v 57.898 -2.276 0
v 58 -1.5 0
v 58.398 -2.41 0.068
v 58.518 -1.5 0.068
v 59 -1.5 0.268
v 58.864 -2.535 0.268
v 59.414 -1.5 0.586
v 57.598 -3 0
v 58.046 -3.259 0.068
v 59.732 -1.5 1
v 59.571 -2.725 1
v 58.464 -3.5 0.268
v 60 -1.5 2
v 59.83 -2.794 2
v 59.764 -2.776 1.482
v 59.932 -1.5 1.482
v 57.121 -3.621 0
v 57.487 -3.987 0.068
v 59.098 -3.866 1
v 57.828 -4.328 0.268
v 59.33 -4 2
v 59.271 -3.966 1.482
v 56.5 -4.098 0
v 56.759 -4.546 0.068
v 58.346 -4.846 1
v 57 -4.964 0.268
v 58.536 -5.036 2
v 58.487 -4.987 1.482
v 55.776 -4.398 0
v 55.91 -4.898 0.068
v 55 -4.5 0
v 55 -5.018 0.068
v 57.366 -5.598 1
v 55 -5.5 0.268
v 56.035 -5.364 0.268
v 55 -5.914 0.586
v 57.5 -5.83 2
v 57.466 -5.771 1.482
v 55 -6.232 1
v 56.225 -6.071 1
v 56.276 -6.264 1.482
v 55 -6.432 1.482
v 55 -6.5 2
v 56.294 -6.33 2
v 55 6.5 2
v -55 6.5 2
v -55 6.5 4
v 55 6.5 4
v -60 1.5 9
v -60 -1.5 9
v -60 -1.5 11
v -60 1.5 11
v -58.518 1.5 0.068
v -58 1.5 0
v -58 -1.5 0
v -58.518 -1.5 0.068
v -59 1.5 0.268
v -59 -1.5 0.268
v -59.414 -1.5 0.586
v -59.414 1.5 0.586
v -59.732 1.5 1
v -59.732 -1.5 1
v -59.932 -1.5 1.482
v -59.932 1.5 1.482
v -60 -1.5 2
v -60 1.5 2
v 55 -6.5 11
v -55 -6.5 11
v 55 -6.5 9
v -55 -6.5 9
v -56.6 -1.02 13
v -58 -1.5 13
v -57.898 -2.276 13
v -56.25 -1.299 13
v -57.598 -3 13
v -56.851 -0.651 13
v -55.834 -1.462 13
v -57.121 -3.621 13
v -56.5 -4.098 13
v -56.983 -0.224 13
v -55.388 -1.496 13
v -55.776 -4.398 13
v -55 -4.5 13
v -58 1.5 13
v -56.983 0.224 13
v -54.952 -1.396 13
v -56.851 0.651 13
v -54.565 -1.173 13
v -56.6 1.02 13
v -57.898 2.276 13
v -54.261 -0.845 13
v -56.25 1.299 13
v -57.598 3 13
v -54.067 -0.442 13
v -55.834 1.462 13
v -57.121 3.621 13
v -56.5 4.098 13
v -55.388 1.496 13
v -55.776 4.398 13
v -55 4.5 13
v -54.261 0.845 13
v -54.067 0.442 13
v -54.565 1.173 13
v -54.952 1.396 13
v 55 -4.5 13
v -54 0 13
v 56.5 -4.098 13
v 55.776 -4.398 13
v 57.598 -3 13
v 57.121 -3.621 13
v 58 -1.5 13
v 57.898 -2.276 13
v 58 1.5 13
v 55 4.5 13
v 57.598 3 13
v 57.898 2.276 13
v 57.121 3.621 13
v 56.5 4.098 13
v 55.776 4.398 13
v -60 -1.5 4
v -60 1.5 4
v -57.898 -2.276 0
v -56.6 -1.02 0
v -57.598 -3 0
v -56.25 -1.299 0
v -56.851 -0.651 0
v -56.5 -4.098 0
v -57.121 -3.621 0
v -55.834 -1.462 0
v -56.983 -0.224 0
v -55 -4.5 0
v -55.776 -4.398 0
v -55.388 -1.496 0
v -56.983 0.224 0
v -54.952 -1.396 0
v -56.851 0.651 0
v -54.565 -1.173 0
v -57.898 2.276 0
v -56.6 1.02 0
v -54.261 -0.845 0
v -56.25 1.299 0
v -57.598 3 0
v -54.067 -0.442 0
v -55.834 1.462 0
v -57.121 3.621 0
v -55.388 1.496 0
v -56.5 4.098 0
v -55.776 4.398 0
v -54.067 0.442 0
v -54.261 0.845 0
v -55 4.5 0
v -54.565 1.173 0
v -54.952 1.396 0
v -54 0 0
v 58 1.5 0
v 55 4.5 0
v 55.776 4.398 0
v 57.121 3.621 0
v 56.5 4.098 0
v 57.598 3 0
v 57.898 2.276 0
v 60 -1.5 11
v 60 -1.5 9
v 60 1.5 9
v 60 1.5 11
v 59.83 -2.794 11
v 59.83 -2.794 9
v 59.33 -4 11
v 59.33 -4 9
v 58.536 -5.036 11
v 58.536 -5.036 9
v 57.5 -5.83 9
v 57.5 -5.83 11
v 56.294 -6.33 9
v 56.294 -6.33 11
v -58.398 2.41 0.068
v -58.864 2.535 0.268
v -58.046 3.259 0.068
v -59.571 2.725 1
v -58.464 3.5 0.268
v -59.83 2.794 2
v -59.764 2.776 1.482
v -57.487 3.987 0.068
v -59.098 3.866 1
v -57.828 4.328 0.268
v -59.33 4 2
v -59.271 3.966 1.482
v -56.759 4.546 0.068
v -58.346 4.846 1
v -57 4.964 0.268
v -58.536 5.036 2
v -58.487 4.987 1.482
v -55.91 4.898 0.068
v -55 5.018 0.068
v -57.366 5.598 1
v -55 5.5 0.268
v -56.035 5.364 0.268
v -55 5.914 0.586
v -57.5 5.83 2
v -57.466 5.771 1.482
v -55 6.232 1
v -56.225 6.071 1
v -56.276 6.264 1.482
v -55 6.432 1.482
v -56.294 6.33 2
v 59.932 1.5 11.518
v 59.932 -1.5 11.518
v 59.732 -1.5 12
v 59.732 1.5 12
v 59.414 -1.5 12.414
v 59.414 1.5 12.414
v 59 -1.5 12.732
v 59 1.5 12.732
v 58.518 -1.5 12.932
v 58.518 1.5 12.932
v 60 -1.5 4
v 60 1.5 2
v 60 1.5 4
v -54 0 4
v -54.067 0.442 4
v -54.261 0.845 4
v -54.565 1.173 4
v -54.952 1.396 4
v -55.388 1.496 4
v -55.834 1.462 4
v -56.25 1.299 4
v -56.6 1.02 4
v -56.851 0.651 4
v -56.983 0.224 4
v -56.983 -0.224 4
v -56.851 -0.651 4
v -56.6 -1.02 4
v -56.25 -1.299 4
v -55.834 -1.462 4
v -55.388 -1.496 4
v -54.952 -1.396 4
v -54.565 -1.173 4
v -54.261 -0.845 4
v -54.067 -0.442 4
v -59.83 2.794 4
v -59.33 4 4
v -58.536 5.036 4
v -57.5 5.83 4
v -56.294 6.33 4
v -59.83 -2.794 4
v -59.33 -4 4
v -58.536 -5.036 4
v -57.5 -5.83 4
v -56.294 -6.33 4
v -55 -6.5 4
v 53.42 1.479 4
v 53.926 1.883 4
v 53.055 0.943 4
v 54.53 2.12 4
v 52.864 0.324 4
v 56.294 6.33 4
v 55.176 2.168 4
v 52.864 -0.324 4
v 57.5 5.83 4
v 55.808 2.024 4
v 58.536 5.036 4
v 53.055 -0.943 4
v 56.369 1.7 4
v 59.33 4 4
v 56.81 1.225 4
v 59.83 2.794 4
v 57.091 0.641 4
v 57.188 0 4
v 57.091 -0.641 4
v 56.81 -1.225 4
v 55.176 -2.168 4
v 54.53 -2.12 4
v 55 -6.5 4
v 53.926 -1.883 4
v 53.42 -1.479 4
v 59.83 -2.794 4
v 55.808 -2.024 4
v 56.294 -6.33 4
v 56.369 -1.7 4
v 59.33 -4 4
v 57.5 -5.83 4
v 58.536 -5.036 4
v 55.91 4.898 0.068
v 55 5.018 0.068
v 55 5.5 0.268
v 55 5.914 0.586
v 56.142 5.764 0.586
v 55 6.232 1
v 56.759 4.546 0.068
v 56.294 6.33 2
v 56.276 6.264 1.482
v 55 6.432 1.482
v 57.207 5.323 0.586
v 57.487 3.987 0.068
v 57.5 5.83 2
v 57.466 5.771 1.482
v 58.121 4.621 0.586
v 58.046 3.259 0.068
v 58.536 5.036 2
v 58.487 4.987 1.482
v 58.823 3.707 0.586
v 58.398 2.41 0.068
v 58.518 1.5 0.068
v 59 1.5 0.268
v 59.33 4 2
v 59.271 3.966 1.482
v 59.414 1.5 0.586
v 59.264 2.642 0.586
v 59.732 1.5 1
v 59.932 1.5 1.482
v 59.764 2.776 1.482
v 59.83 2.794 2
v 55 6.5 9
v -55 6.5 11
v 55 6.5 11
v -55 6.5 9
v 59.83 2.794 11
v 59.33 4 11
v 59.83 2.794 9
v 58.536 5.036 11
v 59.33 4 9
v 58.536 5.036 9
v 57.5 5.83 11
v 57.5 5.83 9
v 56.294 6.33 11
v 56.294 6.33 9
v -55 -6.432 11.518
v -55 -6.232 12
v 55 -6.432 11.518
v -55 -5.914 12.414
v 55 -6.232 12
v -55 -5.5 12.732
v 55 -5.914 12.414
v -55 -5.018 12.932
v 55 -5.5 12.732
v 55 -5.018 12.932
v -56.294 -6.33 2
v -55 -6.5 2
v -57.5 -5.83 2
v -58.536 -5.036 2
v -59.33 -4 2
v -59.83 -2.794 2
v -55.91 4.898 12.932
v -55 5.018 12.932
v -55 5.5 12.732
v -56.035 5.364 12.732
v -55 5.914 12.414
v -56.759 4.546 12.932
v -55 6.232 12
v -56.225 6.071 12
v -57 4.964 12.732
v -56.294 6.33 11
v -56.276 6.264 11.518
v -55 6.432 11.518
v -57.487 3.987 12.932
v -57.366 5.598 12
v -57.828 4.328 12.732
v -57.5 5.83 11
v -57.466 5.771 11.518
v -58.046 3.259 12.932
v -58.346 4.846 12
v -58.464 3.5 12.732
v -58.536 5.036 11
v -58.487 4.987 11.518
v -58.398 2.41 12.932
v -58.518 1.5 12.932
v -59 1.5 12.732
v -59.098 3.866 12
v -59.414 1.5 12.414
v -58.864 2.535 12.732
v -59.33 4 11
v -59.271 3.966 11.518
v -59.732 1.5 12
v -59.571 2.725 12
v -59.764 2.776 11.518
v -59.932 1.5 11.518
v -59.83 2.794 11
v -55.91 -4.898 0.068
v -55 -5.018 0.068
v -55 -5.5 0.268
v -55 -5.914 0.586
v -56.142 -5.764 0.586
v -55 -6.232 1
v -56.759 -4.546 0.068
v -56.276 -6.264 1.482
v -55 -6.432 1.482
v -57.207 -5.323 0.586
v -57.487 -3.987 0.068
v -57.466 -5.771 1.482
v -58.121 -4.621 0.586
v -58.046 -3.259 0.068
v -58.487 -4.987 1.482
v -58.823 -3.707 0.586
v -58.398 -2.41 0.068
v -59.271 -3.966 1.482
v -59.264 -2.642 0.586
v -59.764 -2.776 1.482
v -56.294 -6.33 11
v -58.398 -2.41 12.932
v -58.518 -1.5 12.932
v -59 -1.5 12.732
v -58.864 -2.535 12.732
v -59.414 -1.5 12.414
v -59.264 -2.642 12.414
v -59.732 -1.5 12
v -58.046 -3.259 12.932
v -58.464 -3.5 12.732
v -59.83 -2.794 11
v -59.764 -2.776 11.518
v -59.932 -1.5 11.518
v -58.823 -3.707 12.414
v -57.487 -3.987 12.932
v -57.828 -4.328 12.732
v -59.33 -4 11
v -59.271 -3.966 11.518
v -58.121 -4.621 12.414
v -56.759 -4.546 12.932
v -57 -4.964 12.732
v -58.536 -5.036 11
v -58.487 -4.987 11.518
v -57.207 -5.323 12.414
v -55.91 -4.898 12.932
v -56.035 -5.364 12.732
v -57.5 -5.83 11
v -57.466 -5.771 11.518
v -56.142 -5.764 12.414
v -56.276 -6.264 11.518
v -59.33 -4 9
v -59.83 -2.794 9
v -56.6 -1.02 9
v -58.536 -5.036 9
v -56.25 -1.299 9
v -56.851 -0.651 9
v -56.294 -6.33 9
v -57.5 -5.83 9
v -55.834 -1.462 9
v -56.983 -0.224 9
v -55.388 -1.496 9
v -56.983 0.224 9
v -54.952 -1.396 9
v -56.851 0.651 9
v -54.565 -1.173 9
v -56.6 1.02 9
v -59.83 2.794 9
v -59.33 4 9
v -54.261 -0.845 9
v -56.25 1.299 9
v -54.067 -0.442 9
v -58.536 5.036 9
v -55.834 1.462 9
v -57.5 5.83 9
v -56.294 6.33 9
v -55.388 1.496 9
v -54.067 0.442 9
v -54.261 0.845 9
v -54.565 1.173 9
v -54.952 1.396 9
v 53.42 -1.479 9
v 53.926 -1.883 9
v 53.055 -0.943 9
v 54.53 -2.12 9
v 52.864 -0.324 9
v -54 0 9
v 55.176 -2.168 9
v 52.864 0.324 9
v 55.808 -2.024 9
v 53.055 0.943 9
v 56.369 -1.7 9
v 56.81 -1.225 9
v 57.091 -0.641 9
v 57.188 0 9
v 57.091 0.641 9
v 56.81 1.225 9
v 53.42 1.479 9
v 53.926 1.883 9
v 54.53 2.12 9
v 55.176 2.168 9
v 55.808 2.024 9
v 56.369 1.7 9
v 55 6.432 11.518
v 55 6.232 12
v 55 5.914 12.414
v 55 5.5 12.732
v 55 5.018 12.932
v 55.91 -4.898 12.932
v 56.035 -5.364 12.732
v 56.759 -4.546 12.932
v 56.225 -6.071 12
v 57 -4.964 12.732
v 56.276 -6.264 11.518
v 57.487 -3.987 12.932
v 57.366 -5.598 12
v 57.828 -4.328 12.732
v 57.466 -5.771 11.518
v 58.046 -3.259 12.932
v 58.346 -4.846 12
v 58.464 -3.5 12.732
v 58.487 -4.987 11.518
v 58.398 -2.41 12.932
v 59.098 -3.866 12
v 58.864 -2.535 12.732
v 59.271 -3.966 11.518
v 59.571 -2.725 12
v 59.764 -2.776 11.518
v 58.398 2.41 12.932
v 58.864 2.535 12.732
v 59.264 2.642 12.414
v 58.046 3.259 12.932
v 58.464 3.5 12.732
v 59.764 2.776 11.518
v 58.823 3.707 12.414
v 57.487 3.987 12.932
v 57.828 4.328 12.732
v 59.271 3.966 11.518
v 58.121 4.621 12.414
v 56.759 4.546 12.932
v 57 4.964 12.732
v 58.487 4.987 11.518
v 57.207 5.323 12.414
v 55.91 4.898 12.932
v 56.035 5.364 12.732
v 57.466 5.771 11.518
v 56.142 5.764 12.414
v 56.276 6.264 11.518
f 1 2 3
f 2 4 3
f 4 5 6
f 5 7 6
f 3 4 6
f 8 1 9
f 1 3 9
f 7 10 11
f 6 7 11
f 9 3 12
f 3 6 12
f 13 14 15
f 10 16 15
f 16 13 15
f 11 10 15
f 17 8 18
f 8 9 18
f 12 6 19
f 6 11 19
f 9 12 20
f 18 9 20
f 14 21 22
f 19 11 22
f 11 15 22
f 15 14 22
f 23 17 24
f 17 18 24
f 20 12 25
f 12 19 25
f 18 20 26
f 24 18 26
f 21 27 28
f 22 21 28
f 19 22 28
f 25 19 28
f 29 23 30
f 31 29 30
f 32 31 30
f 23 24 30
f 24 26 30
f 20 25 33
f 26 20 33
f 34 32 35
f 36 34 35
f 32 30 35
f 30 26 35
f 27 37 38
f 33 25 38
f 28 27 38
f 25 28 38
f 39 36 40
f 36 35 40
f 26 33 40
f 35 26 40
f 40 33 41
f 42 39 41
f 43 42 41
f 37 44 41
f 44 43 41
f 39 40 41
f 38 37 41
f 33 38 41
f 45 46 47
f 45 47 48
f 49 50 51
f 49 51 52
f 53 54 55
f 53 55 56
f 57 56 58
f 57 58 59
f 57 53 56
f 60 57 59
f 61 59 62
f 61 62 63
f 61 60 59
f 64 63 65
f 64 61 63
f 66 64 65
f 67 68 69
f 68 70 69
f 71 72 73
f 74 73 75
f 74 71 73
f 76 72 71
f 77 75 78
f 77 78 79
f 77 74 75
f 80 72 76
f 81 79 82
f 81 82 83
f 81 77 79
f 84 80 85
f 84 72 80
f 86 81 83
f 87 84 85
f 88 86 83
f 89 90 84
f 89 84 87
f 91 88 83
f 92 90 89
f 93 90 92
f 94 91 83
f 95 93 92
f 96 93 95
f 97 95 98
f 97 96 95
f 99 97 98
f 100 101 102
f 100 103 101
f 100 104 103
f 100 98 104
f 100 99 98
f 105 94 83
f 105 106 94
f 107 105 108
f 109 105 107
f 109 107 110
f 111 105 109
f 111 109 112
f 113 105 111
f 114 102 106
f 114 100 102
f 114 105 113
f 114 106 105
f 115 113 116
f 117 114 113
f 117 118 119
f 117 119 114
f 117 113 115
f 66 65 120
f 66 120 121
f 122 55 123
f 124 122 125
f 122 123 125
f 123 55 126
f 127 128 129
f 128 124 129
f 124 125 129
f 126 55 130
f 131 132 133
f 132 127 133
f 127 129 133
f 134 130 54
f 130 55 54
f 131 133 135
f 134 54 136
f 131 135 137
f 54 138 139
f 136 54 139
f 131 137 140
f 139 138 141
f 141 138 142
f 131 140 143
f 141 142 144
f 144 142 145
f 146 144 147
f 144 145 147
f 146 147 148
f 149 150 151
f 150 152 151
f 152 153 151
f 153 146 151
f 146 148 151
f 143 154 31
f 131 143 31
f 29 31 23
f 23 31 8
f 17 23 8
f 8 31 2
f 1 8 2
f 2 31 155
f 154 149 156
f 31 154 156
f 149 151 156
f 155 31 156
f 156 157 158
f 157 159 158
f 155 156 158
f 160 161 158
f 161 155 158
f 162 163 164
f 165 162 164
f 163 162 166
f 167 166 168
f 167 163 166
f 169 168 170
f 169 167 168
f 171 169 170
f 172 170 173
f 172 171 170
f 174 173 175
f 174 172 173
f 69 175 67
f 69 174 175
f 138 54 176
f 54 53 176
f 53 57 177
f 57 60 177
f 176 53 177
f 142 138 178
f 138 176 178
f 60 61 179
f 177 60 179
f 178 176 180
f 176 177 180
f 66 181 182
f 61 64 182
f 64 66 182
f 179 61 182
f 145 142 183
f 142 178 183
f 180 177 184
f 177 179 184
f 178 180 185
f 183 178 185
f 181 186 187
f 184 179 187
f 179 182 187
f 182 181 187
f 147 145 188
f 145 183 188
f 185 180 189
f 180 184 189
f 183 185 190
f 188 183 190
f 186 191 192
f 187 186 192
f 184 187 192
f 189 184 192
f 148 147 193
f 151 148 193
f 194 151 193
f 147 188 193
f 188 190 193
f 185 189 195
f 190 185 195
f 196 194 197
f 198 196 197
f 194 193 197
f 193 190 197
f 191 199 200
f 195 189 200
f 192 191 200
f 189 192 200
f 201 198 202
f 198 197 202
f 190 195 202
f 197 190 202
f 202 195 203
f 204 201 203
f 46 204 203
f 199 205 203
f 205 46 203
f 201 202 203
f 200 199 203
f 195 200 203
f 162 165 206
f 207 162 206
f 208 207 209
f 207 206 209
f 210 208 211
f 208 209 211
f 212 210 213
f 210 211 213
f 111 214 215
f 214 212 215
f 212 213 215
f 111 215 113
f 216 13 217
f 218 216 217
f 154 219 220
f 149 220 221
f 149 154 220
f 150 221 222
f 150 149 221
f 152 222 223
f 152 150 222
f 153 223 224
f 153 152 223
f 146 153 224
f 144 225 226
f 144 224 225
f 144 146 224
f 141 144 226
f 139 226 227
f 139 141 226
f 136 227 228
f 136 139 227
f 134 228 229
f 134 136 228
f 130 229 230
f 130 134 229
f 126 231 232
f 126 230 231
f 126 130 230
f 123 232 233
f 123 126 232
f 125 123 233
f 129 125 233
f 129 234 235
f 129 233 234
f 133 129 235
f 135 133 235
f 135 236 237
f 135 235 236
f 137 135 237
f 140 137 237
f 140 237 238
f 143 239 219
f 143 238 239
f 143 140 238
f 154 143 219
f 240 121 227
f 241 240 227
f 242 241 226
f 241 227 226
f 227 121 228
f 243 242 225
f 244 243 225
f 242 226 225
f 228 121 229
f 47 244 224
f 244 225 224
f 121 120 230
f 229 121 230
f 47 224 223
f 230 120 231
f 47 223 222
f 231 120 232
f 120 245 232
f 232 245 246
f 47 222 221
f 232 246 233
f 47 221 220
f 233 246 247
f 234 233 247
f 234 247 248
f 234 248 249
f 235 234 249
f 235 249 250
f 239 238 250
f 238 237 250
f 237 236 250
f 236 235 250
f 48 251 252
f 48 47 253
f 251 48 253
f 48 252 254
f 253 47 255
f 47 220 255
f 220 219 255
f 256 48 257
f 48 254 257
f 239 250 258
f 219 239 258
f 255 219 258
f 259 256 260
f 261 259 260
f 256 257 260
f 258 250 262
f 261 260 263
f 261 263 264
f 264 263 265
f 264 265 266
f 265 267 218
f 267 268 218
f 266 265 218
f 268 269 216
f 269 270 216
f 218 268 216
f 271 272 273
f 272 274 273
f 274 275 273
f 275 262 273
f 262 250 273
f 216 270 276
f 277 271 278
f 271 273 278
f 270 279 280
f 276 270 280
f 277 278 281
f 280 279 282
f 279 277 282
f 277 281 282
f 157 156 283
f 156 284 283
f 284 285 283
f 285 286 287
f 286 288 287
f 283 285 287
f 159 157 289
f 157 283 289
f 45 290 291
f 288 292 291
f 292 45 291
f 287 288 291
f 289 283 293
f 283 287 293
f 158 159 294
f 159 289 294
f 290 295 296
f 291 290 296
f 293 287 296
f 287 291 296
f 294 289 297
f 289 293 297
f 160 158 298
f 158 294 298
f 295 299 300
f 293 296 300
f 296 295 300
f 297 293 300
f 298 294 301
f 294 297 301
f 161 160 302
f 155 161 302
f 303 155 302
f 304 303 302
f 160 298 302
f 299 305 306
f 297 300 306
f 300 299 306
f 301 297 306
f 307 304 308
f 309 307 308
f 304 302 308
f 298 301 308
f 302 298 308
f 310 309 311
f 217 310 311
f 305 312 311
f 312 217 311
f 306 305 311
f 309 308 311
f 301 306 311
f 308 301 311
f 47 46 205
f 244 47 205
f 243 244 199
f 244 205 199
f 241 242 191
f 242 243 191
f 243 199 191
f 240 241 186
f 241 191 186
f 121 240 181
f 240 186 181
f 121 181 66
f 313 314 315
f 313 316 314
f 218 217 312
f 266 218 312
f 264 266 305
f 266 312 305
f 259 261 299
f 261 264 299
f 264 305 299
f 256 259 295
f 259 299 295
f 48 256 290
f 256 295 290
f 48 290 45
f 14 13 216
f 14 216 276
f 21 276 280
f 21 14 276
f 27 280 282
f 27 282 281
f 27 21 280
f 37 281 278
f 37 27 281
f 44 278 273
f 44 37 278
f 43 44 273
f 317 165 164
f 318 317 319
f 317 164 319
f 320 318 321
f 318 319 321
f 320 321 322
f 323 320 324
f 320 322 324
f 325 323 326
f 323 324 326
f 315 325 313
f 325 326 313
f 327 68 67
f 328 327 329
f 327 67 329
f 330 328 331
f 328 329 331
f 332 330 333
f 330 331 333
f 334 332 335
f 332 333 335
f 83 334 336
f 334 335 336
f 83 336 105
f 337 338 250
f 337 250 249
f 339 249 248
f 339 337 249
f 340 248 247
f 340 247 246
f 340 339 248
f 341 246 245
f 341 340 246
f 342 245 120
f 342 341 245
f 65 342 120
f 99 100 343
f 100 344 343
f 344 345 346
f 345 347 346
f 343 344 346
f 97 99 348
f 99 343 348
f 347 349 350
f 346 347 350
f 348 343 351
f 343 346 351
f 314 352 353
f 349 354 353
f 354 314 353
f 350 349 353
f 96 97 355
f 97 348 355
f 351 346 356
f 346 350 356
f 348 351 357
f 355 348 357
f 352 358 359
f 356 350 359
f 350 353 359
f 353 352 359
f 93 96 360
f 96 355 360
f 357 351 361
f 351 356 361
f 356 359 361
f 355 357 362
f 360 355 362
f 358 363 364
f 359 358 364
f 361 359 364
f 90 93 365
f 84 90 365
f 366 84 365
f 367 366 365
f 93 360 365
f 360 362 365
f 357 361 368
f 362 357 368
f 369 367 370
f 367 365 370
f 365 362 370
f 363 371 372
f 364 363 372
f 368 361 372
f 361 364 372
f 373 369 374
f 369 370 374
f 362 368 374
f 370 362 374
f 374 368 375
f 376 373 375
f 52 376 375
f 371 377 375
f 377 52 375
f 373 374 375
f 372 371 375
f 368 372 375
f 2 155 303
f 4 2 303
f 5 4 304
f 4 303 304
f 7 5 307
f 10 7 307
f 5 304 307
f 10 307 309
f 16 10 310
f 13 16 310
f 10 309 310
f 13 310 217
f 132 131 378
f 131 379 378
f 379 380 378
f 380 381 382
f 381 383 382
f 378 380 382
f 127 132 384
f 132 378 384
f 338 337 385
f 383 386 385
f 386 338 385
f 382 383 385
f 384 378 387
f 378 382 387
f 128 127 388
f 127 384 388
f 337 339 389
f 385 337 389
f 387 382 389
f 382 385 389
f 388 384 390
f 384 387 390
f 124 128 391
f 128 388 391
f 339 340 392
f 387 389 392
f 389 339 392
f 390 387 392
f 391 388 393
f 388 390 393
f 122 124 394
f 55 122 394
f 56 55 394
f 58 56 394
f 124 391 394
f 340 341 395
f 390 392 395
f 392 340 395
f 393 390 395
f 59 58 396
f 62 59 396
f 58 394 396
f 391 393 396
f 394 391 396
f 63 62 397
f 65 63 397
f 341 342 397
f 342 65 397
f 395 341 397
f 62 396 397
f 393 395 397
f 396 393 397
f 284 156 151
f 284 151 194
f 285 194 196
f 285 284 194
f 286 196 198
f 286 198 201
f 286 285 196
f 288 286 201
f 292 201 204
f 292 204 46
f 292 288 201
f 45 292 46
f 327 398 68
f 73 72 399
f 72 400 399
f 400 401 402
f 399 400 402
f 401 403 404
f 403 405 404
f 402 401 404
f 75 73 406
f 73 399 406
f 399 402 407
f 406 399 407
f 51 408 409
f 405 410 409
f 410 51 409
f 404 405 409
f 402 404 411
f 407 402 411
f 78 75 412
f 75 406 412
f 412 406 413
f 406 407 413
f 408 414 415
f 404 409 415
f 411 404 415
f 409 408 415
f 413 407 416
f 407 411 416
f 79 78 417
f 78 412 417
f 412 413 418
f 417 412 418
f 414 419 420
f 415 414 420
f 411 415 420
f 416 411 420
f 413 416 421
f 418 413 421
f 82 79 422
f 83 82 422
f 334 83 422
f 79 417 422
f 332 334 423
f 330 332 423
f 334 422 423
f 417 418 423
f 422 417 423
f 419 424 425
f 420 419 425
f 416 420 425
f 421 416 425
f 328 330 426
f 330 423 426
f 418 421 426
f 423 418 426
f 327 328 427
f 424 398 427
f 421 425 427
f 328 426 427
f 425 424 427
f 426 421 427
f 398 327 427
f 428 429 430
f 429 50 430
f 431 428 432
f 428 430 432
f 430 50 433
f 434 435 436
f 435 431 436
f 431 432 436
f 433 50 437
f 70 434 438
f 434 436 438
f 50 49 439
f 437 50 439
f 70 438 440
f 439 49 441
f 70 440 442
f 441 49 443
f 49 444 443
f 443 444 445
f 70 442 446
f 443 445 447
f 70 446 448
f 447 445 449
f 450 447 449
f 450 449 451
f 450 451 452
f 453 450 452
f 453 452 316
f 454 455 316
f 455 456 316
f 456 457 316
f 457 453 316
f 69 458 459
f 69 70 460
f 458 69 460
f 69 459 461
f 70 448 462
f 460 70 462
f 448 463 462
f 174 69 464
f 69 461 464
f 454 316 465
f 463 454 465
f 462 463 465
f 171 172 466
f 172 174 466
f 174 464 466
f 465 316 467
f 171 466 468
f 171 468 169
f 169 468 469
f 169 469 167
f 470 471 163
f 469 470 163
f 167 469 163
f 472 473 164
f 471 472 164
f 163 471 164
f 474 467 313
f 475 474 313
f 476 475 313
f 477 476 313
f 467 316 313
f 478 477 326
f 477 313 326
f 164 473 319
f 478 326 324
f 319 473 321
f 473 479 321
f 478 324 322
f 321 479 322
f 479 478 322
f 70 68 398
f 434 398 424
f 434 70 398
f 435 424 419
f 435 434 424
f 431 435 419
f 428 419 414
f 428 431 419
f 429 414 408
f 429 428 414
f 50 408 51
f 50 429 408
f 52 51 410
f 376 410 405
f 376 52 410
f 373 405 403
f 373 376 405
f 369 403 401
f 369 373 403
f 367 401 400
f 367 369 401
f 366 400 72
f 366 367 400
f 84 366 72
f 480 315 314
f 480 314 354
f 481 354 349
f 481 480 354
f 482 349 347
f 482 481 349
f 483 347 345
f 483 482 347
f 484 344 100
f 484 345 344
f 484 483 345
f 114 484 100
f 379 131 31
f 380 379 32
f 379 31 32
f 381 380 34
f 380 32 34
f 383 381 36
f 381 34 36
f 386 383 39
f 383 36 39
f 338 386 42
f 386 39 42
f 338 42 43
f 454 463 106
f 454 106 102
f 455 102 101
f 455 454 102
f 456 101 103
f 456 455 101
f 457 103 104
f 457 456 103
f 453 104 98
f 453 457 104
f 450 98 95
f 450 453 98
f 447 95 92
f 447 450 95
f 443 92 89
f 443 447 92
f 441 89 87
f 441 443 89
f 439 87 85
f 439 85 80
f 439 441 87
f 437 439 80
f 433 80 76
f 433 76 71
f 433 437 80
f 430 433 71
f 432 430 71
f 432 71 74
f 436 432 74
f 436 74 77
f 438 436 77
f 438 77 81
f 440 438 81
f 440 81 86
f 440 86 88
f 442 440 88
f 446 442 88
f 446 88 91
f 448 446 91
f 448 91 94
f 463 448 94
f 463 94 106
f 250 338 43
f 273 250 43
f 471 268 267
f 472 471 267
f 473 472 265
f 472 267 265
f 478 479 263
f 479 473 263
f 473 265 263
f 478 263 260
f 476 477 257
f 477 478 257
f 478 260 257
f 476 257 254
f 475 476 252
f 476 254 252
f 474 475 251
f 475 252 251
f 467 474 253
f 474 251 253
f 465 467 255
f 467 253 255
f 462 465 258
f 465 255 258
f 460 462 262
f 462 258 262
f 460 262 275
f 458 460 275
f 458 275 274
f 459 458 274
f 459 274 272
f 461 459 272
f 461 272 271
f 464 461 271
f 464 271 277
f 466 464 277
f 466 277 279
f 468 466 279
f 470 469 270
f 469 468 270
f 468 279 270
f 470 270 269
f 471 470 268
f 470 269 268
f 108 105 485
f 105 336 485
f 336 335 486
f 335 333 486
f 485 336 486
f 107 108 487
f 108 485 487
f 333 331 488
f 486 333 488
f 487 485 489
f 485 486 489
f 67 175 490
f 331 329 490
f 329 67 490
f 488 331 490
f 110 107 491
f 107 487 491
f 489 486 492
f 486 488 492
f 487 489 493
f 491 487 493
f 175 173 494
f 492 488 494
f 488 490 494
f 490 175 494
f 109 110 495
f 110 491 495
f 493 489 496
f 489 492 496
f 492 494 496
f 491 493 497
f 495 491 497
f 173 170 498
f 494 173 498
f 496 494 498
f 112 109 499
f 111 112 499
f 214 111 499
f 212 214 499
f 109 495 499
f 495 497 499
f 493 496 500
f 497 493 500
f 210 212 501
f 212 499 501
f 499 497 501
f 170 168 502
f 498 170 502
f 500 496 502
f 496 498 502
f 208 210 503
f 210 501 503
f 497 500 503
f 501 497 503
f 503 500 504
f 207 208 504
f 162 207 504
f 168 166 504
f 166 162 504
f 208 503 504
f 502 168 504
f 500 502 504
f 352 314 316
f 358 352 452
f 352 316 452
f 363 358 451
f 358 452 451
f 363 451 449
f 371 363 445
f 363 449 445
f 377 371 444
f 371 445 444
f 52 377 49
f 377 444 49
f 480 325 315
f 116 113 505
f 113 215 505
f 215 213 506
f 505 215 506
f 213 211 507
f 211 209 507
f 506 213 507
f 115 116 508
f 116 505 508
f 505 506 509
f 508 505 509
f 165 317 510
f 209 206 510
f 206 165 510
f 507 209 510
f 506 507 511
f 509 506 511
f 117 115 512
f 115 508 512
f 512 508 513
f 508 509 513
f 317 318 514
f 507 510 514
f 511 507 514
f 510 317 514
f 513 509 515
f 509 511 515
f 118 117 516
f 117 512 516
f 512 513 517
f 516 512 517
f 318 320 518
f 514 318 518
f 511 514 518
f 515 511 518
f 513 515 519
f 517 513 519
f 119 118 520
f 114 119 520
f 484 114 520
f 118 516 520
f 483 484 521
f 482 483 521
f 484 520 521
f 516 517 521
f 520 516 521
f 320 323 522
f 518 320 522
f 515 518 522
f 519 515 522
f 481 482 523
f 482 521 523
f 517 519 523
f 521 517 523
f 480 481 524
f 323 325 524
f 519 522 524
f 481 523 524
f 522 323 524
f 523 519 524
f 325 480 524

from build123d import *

# Parameters (mm, degrees)
F0_W          = 120
F0_H          = 13
F0_R          = 1.5
F1_DEPTH      = 13
F2_W          = 120
F2_H          = 5
F3_DEPTH      = 8
F3_DEPTH_BACK = 8
F4_R          = 2.1741492727
F5_DEPTH      = 13
F6_R          = 2
F7_T1_DEPTH   = 16.5
F7_T3_DEPTH   = 16.5
F7_T6_ANGLE   = 90
F7_T8_ANGLE   = 90
F7_T10_ANGLE  = 90
F7_T12_ANGLE  = 90
F7_T14_ANGLE  = 90
F7_T16_ANGLE  = 90
F7_T18_ANGLE  = 90
F7_T20_ANGLE  = 90


# Not quite as in the source:
# - a fillet or chamfer that OpenCascade refuses, or shapes differently, is made with other operations: its cross-section is extruded or revolved along the edge and cut away or added


with BuildPart() as f1:
    # F0 (on Top) → F1 (new body)
    with BuildSketch(Plane.XY):
        Rectangle(F0_W, F0_H)
        with Locations((-55.5, 0)):
            Circle(F0_R, mode=Mode.SUBTRACT)
    extrude(amount=F1_DEPTH)

    # F2 (on Front) → F3 (cut, two sides)
    with BuildSketch(Plane.XZ) as f3_sk:
        with Locations((0, 6.5)):
            Rectangle(F2_W, F2_H)
    extrude(amount=-F3_DEPTH, mode=Mode.SUBTRACT)
    extrude(f3_sk.sketch, amount=F3_DEPTH_BACK, mode=Mode.SUBTRACT)

    # F4 (on Top) → F5 (join)
    with BuildSketch(Plane.XY):
        with Locations((55.0134144723, 0)):
            Circle(F4_R)
    extrude(amount=F5_DEPTH)

    # F6
    f6_edges = [f1.edges().sort_by_distance(p)[0] for p in [
        (0, -6.5, 13),
        (-60, 0, 13),
        (0, 6.5, 13),
        (60, 0, 13),
        (-60, 0, 0),
        (0, -6.5, 0),
        (60, 0, 0),
        (0, 6.5, 0),
    ]]
    fillet(f6_edges, radius=F6_R)

    # F7: fillet of radius 5 on 8 edges, made by hand

    # F7_s2 → F7_t1 (cut)
    with BuildSketch(Plane.XY.offset(-3.5)):
        with BuildLine():
            ThreePointArc((-55, -6.5), (-58.5355339059, -5.0355339059), (-60, -1.5))
            Line((-60, -1.5), (-60, -6.5))
            Line((-60, -6.5), (-55, -6.5))
        make_face()
        with BuildLine():
            ThreePointArc((-55, 6.5), (-58.5355339059, 5.0355339059), (-60, 1.5))
            Line((-60, 1.5), (-60, 6.5))
            Line((-60, 6.5), (-55, 6.5))
        make_face()
        with BuildLine():
            ThreePointArc((60, -1.5), (58.5355339059, -5.0355339059), (55, -6.5))
            Line((55, -6.5), (60, -6.5))
            Line((60, -6.5), (60, -1.5))
        make_face()
        with BuildLine():
            ThreePointArc((60, 1.5), (58.5355339059, 5.0355339059), (55, 6.5))
            Line((55, 6.5), (60, 6.5))
            Line((60, 6.5), (60, 1.5))
        make_face()
    extrude(amount=F7_T1_DEPTH, mode=Mode.SUBTRACT)

    # F7_s4 → F7_t3 (cut)
    with BuildSketch(Plane.XY):
        with BuildLine():
            ThreePointArc((-55, -6.5), (-58.5355339059, -5.0355339059), (-60, -1.5))
            Line((-60, -1.5), (-60, -6.5))
            Line((-60, -6.5), (-55, -6.5))
        make_face()
        with BuildLine():
            ThreePointArc((-55, 6.5), (-58.5355339059, 5.0355339059), (-60, 1.5))
            Line((-60, 1.5), (-60, 6.5))
            Line((-60, 6.5), (-55, 6.5))
        make_face()
        with BuildLine():
            ThreePointArc((60, -1.5), (58.5355339059, -5.0355339059), (55, -6.5))
            Line((55, -6.5), (60, -6.5))
            Line((60, -6.5), (60, -1.5))
        make_face()
        with BuildLine():
            ThreePointArc((60, 1.5), (58.5355339059, 5.0355339059), (55, 6.5))
            Line((55, 6.5), (60, 6.5))
            Line((60, 6.5), (60, 1.5))
        make_face()
    extrude(amount=F7_T3_DEPTH, mode=Mode.SUBTRACT)

    # F7_s5 → F7_t6 (revolve, cut)
    with BuildSketch(Plane.YZ.offset(55)):
        with BuildLine():
            ThreePointArc((4.5, 0), (5.9142135624, 0.5857864376), (6.5, 2))
            Line((6.5, 2), (6.5, 0))
            Line((6.5, 0), (4.5, 0))
        make_face()
    revolve(axis=Axis((55, 1.5, 0), (0, 0, -1)), revolution_arc=F7_T6_ANGLE, mode=Mode.SUBTRACT)

    # F7_s7 → F7_t8 (revolve, cut)
    with BuildSketch(Plane.XZ.offset(1.5)):
        with BuildLine():
            ThreePointArc((58, 0), (59.4142135624, 0.5857864376), (60, 2))
            Line((60, 2), (60, 0))
            Line((60, 0), (58, 0))
        make_face()
    revolve(axis=Axis((55, -1.5, 0), (0, 0, -1)), revolution_arc=F7_T8_ANGLE, mode=Mode.SUBTRACT)

    # F7_s9 → F7_t10 (revolve, cut)
    with BuildSketch(Plane.XZ.offset(-1.5)):
        with BuildLine():
            ThreePointArc((58, 13), (59.4142135624, 12.4142135624), (60, 11))
            Line((60, 11), (60, 13))
            Line((60, 13), (58, 13))
        make_face()
    revolve(axis=Axis((55, 1.5, 13), (0, 0, 1)), revolution_arc=F7_T10_ANGLE, mode=Mode.SUBTRACT)

    # F7_s11 → F7_t12 (revolve, cut)
    with BuildSketch(Plane.YZ.offset(55)):
        with BuildLine():
            ThreePointArc((-4.5, 13), (-5.9142135624, 12.4142135624), (-6.5, 11))
            Line((-6.5, 11), (-6.5, 13))
            Line((-6.5, 13), (-4.5, 13))
        make_face()
    revolve(axis=Axis((55, -1.5, 13), (0, 0, 1)), revolution_arc=F7_T12_ANGLE, mode=Mode.SUBTRACT)

    # F7_s13 → F7_t14 (revolve, cut)
    with BuildSketch(Plane.XZ.offset(-1.5)):
        with BuildLine():
            ThreePointArc((-58, 0), (-59.4142135624, 0.5857864376), (-60, 2))
            Line((-60, 2), (-60, 0))
            Line((-60, 0), (-58, 0))
        make_face()
    revolve(axis=Axis((-55, 1.5, 0), (0, 0, -1)), revolution_arc=F7_T14_ANGLE, mode=Mode.SUBTRACT)

    # F7_s15 → F7_t16 (revolve, cut)
    with BuildSketch(Plane.YZ.offset(-55)):
        with BuildLine():
            ThreePointArc((-4.5, 0), (-5.9142135624, 0.5857864376), (-6.5, 2))
            Line((-6.5, 2), (-6.5, 0))
            Line((-6.5, 0), (-4.5, 0))
        make_face()
    revolve(axis=Axis((-55, -1.5, 0), (0, 0, -1)), revolution_arc=F7_T16_ANGLE, mode=Mode.SUBTRACT)

    # F7_s17 → F7_t18 (revolve, cut)
    with BuildSketch(Plane.YZ.offset(-55)):
        with BuildLine():
            ThreePointArc((4.5, 13), (5.9142135624, 12.4142135624), (6.5, 11))
            Line((6.5, 11), (6.5, 13))
            Line((6.5, 13), (4.5, 13))
        make_face()
    revolve(axis=Axis((-55, 1.5, 13), (0, 0, 1)), revolution_arc=F7_T18_ANGLE, mode=Mode.SUBTRACT)

    # F7_s19 → F7_t20 (revolve, cut)
    with BuildSketch(Plane.XZ.offset(1.5)):
        with BuildLine():
            ThreePointArc((-58, 13), (-59.4142135624, 12.4142135624), (-60, 11))
            Line((-60, 11), (-60, 13))
            Line((-60, 13), (-58, 13))
        make_face()
    revolve(axis=Axis((-55, -1.5, 13), (0, 0, 1)), revolution_arc=F7_T20_ANGLE, mode=Mode.SUBTRACT)


solid = f1.part
